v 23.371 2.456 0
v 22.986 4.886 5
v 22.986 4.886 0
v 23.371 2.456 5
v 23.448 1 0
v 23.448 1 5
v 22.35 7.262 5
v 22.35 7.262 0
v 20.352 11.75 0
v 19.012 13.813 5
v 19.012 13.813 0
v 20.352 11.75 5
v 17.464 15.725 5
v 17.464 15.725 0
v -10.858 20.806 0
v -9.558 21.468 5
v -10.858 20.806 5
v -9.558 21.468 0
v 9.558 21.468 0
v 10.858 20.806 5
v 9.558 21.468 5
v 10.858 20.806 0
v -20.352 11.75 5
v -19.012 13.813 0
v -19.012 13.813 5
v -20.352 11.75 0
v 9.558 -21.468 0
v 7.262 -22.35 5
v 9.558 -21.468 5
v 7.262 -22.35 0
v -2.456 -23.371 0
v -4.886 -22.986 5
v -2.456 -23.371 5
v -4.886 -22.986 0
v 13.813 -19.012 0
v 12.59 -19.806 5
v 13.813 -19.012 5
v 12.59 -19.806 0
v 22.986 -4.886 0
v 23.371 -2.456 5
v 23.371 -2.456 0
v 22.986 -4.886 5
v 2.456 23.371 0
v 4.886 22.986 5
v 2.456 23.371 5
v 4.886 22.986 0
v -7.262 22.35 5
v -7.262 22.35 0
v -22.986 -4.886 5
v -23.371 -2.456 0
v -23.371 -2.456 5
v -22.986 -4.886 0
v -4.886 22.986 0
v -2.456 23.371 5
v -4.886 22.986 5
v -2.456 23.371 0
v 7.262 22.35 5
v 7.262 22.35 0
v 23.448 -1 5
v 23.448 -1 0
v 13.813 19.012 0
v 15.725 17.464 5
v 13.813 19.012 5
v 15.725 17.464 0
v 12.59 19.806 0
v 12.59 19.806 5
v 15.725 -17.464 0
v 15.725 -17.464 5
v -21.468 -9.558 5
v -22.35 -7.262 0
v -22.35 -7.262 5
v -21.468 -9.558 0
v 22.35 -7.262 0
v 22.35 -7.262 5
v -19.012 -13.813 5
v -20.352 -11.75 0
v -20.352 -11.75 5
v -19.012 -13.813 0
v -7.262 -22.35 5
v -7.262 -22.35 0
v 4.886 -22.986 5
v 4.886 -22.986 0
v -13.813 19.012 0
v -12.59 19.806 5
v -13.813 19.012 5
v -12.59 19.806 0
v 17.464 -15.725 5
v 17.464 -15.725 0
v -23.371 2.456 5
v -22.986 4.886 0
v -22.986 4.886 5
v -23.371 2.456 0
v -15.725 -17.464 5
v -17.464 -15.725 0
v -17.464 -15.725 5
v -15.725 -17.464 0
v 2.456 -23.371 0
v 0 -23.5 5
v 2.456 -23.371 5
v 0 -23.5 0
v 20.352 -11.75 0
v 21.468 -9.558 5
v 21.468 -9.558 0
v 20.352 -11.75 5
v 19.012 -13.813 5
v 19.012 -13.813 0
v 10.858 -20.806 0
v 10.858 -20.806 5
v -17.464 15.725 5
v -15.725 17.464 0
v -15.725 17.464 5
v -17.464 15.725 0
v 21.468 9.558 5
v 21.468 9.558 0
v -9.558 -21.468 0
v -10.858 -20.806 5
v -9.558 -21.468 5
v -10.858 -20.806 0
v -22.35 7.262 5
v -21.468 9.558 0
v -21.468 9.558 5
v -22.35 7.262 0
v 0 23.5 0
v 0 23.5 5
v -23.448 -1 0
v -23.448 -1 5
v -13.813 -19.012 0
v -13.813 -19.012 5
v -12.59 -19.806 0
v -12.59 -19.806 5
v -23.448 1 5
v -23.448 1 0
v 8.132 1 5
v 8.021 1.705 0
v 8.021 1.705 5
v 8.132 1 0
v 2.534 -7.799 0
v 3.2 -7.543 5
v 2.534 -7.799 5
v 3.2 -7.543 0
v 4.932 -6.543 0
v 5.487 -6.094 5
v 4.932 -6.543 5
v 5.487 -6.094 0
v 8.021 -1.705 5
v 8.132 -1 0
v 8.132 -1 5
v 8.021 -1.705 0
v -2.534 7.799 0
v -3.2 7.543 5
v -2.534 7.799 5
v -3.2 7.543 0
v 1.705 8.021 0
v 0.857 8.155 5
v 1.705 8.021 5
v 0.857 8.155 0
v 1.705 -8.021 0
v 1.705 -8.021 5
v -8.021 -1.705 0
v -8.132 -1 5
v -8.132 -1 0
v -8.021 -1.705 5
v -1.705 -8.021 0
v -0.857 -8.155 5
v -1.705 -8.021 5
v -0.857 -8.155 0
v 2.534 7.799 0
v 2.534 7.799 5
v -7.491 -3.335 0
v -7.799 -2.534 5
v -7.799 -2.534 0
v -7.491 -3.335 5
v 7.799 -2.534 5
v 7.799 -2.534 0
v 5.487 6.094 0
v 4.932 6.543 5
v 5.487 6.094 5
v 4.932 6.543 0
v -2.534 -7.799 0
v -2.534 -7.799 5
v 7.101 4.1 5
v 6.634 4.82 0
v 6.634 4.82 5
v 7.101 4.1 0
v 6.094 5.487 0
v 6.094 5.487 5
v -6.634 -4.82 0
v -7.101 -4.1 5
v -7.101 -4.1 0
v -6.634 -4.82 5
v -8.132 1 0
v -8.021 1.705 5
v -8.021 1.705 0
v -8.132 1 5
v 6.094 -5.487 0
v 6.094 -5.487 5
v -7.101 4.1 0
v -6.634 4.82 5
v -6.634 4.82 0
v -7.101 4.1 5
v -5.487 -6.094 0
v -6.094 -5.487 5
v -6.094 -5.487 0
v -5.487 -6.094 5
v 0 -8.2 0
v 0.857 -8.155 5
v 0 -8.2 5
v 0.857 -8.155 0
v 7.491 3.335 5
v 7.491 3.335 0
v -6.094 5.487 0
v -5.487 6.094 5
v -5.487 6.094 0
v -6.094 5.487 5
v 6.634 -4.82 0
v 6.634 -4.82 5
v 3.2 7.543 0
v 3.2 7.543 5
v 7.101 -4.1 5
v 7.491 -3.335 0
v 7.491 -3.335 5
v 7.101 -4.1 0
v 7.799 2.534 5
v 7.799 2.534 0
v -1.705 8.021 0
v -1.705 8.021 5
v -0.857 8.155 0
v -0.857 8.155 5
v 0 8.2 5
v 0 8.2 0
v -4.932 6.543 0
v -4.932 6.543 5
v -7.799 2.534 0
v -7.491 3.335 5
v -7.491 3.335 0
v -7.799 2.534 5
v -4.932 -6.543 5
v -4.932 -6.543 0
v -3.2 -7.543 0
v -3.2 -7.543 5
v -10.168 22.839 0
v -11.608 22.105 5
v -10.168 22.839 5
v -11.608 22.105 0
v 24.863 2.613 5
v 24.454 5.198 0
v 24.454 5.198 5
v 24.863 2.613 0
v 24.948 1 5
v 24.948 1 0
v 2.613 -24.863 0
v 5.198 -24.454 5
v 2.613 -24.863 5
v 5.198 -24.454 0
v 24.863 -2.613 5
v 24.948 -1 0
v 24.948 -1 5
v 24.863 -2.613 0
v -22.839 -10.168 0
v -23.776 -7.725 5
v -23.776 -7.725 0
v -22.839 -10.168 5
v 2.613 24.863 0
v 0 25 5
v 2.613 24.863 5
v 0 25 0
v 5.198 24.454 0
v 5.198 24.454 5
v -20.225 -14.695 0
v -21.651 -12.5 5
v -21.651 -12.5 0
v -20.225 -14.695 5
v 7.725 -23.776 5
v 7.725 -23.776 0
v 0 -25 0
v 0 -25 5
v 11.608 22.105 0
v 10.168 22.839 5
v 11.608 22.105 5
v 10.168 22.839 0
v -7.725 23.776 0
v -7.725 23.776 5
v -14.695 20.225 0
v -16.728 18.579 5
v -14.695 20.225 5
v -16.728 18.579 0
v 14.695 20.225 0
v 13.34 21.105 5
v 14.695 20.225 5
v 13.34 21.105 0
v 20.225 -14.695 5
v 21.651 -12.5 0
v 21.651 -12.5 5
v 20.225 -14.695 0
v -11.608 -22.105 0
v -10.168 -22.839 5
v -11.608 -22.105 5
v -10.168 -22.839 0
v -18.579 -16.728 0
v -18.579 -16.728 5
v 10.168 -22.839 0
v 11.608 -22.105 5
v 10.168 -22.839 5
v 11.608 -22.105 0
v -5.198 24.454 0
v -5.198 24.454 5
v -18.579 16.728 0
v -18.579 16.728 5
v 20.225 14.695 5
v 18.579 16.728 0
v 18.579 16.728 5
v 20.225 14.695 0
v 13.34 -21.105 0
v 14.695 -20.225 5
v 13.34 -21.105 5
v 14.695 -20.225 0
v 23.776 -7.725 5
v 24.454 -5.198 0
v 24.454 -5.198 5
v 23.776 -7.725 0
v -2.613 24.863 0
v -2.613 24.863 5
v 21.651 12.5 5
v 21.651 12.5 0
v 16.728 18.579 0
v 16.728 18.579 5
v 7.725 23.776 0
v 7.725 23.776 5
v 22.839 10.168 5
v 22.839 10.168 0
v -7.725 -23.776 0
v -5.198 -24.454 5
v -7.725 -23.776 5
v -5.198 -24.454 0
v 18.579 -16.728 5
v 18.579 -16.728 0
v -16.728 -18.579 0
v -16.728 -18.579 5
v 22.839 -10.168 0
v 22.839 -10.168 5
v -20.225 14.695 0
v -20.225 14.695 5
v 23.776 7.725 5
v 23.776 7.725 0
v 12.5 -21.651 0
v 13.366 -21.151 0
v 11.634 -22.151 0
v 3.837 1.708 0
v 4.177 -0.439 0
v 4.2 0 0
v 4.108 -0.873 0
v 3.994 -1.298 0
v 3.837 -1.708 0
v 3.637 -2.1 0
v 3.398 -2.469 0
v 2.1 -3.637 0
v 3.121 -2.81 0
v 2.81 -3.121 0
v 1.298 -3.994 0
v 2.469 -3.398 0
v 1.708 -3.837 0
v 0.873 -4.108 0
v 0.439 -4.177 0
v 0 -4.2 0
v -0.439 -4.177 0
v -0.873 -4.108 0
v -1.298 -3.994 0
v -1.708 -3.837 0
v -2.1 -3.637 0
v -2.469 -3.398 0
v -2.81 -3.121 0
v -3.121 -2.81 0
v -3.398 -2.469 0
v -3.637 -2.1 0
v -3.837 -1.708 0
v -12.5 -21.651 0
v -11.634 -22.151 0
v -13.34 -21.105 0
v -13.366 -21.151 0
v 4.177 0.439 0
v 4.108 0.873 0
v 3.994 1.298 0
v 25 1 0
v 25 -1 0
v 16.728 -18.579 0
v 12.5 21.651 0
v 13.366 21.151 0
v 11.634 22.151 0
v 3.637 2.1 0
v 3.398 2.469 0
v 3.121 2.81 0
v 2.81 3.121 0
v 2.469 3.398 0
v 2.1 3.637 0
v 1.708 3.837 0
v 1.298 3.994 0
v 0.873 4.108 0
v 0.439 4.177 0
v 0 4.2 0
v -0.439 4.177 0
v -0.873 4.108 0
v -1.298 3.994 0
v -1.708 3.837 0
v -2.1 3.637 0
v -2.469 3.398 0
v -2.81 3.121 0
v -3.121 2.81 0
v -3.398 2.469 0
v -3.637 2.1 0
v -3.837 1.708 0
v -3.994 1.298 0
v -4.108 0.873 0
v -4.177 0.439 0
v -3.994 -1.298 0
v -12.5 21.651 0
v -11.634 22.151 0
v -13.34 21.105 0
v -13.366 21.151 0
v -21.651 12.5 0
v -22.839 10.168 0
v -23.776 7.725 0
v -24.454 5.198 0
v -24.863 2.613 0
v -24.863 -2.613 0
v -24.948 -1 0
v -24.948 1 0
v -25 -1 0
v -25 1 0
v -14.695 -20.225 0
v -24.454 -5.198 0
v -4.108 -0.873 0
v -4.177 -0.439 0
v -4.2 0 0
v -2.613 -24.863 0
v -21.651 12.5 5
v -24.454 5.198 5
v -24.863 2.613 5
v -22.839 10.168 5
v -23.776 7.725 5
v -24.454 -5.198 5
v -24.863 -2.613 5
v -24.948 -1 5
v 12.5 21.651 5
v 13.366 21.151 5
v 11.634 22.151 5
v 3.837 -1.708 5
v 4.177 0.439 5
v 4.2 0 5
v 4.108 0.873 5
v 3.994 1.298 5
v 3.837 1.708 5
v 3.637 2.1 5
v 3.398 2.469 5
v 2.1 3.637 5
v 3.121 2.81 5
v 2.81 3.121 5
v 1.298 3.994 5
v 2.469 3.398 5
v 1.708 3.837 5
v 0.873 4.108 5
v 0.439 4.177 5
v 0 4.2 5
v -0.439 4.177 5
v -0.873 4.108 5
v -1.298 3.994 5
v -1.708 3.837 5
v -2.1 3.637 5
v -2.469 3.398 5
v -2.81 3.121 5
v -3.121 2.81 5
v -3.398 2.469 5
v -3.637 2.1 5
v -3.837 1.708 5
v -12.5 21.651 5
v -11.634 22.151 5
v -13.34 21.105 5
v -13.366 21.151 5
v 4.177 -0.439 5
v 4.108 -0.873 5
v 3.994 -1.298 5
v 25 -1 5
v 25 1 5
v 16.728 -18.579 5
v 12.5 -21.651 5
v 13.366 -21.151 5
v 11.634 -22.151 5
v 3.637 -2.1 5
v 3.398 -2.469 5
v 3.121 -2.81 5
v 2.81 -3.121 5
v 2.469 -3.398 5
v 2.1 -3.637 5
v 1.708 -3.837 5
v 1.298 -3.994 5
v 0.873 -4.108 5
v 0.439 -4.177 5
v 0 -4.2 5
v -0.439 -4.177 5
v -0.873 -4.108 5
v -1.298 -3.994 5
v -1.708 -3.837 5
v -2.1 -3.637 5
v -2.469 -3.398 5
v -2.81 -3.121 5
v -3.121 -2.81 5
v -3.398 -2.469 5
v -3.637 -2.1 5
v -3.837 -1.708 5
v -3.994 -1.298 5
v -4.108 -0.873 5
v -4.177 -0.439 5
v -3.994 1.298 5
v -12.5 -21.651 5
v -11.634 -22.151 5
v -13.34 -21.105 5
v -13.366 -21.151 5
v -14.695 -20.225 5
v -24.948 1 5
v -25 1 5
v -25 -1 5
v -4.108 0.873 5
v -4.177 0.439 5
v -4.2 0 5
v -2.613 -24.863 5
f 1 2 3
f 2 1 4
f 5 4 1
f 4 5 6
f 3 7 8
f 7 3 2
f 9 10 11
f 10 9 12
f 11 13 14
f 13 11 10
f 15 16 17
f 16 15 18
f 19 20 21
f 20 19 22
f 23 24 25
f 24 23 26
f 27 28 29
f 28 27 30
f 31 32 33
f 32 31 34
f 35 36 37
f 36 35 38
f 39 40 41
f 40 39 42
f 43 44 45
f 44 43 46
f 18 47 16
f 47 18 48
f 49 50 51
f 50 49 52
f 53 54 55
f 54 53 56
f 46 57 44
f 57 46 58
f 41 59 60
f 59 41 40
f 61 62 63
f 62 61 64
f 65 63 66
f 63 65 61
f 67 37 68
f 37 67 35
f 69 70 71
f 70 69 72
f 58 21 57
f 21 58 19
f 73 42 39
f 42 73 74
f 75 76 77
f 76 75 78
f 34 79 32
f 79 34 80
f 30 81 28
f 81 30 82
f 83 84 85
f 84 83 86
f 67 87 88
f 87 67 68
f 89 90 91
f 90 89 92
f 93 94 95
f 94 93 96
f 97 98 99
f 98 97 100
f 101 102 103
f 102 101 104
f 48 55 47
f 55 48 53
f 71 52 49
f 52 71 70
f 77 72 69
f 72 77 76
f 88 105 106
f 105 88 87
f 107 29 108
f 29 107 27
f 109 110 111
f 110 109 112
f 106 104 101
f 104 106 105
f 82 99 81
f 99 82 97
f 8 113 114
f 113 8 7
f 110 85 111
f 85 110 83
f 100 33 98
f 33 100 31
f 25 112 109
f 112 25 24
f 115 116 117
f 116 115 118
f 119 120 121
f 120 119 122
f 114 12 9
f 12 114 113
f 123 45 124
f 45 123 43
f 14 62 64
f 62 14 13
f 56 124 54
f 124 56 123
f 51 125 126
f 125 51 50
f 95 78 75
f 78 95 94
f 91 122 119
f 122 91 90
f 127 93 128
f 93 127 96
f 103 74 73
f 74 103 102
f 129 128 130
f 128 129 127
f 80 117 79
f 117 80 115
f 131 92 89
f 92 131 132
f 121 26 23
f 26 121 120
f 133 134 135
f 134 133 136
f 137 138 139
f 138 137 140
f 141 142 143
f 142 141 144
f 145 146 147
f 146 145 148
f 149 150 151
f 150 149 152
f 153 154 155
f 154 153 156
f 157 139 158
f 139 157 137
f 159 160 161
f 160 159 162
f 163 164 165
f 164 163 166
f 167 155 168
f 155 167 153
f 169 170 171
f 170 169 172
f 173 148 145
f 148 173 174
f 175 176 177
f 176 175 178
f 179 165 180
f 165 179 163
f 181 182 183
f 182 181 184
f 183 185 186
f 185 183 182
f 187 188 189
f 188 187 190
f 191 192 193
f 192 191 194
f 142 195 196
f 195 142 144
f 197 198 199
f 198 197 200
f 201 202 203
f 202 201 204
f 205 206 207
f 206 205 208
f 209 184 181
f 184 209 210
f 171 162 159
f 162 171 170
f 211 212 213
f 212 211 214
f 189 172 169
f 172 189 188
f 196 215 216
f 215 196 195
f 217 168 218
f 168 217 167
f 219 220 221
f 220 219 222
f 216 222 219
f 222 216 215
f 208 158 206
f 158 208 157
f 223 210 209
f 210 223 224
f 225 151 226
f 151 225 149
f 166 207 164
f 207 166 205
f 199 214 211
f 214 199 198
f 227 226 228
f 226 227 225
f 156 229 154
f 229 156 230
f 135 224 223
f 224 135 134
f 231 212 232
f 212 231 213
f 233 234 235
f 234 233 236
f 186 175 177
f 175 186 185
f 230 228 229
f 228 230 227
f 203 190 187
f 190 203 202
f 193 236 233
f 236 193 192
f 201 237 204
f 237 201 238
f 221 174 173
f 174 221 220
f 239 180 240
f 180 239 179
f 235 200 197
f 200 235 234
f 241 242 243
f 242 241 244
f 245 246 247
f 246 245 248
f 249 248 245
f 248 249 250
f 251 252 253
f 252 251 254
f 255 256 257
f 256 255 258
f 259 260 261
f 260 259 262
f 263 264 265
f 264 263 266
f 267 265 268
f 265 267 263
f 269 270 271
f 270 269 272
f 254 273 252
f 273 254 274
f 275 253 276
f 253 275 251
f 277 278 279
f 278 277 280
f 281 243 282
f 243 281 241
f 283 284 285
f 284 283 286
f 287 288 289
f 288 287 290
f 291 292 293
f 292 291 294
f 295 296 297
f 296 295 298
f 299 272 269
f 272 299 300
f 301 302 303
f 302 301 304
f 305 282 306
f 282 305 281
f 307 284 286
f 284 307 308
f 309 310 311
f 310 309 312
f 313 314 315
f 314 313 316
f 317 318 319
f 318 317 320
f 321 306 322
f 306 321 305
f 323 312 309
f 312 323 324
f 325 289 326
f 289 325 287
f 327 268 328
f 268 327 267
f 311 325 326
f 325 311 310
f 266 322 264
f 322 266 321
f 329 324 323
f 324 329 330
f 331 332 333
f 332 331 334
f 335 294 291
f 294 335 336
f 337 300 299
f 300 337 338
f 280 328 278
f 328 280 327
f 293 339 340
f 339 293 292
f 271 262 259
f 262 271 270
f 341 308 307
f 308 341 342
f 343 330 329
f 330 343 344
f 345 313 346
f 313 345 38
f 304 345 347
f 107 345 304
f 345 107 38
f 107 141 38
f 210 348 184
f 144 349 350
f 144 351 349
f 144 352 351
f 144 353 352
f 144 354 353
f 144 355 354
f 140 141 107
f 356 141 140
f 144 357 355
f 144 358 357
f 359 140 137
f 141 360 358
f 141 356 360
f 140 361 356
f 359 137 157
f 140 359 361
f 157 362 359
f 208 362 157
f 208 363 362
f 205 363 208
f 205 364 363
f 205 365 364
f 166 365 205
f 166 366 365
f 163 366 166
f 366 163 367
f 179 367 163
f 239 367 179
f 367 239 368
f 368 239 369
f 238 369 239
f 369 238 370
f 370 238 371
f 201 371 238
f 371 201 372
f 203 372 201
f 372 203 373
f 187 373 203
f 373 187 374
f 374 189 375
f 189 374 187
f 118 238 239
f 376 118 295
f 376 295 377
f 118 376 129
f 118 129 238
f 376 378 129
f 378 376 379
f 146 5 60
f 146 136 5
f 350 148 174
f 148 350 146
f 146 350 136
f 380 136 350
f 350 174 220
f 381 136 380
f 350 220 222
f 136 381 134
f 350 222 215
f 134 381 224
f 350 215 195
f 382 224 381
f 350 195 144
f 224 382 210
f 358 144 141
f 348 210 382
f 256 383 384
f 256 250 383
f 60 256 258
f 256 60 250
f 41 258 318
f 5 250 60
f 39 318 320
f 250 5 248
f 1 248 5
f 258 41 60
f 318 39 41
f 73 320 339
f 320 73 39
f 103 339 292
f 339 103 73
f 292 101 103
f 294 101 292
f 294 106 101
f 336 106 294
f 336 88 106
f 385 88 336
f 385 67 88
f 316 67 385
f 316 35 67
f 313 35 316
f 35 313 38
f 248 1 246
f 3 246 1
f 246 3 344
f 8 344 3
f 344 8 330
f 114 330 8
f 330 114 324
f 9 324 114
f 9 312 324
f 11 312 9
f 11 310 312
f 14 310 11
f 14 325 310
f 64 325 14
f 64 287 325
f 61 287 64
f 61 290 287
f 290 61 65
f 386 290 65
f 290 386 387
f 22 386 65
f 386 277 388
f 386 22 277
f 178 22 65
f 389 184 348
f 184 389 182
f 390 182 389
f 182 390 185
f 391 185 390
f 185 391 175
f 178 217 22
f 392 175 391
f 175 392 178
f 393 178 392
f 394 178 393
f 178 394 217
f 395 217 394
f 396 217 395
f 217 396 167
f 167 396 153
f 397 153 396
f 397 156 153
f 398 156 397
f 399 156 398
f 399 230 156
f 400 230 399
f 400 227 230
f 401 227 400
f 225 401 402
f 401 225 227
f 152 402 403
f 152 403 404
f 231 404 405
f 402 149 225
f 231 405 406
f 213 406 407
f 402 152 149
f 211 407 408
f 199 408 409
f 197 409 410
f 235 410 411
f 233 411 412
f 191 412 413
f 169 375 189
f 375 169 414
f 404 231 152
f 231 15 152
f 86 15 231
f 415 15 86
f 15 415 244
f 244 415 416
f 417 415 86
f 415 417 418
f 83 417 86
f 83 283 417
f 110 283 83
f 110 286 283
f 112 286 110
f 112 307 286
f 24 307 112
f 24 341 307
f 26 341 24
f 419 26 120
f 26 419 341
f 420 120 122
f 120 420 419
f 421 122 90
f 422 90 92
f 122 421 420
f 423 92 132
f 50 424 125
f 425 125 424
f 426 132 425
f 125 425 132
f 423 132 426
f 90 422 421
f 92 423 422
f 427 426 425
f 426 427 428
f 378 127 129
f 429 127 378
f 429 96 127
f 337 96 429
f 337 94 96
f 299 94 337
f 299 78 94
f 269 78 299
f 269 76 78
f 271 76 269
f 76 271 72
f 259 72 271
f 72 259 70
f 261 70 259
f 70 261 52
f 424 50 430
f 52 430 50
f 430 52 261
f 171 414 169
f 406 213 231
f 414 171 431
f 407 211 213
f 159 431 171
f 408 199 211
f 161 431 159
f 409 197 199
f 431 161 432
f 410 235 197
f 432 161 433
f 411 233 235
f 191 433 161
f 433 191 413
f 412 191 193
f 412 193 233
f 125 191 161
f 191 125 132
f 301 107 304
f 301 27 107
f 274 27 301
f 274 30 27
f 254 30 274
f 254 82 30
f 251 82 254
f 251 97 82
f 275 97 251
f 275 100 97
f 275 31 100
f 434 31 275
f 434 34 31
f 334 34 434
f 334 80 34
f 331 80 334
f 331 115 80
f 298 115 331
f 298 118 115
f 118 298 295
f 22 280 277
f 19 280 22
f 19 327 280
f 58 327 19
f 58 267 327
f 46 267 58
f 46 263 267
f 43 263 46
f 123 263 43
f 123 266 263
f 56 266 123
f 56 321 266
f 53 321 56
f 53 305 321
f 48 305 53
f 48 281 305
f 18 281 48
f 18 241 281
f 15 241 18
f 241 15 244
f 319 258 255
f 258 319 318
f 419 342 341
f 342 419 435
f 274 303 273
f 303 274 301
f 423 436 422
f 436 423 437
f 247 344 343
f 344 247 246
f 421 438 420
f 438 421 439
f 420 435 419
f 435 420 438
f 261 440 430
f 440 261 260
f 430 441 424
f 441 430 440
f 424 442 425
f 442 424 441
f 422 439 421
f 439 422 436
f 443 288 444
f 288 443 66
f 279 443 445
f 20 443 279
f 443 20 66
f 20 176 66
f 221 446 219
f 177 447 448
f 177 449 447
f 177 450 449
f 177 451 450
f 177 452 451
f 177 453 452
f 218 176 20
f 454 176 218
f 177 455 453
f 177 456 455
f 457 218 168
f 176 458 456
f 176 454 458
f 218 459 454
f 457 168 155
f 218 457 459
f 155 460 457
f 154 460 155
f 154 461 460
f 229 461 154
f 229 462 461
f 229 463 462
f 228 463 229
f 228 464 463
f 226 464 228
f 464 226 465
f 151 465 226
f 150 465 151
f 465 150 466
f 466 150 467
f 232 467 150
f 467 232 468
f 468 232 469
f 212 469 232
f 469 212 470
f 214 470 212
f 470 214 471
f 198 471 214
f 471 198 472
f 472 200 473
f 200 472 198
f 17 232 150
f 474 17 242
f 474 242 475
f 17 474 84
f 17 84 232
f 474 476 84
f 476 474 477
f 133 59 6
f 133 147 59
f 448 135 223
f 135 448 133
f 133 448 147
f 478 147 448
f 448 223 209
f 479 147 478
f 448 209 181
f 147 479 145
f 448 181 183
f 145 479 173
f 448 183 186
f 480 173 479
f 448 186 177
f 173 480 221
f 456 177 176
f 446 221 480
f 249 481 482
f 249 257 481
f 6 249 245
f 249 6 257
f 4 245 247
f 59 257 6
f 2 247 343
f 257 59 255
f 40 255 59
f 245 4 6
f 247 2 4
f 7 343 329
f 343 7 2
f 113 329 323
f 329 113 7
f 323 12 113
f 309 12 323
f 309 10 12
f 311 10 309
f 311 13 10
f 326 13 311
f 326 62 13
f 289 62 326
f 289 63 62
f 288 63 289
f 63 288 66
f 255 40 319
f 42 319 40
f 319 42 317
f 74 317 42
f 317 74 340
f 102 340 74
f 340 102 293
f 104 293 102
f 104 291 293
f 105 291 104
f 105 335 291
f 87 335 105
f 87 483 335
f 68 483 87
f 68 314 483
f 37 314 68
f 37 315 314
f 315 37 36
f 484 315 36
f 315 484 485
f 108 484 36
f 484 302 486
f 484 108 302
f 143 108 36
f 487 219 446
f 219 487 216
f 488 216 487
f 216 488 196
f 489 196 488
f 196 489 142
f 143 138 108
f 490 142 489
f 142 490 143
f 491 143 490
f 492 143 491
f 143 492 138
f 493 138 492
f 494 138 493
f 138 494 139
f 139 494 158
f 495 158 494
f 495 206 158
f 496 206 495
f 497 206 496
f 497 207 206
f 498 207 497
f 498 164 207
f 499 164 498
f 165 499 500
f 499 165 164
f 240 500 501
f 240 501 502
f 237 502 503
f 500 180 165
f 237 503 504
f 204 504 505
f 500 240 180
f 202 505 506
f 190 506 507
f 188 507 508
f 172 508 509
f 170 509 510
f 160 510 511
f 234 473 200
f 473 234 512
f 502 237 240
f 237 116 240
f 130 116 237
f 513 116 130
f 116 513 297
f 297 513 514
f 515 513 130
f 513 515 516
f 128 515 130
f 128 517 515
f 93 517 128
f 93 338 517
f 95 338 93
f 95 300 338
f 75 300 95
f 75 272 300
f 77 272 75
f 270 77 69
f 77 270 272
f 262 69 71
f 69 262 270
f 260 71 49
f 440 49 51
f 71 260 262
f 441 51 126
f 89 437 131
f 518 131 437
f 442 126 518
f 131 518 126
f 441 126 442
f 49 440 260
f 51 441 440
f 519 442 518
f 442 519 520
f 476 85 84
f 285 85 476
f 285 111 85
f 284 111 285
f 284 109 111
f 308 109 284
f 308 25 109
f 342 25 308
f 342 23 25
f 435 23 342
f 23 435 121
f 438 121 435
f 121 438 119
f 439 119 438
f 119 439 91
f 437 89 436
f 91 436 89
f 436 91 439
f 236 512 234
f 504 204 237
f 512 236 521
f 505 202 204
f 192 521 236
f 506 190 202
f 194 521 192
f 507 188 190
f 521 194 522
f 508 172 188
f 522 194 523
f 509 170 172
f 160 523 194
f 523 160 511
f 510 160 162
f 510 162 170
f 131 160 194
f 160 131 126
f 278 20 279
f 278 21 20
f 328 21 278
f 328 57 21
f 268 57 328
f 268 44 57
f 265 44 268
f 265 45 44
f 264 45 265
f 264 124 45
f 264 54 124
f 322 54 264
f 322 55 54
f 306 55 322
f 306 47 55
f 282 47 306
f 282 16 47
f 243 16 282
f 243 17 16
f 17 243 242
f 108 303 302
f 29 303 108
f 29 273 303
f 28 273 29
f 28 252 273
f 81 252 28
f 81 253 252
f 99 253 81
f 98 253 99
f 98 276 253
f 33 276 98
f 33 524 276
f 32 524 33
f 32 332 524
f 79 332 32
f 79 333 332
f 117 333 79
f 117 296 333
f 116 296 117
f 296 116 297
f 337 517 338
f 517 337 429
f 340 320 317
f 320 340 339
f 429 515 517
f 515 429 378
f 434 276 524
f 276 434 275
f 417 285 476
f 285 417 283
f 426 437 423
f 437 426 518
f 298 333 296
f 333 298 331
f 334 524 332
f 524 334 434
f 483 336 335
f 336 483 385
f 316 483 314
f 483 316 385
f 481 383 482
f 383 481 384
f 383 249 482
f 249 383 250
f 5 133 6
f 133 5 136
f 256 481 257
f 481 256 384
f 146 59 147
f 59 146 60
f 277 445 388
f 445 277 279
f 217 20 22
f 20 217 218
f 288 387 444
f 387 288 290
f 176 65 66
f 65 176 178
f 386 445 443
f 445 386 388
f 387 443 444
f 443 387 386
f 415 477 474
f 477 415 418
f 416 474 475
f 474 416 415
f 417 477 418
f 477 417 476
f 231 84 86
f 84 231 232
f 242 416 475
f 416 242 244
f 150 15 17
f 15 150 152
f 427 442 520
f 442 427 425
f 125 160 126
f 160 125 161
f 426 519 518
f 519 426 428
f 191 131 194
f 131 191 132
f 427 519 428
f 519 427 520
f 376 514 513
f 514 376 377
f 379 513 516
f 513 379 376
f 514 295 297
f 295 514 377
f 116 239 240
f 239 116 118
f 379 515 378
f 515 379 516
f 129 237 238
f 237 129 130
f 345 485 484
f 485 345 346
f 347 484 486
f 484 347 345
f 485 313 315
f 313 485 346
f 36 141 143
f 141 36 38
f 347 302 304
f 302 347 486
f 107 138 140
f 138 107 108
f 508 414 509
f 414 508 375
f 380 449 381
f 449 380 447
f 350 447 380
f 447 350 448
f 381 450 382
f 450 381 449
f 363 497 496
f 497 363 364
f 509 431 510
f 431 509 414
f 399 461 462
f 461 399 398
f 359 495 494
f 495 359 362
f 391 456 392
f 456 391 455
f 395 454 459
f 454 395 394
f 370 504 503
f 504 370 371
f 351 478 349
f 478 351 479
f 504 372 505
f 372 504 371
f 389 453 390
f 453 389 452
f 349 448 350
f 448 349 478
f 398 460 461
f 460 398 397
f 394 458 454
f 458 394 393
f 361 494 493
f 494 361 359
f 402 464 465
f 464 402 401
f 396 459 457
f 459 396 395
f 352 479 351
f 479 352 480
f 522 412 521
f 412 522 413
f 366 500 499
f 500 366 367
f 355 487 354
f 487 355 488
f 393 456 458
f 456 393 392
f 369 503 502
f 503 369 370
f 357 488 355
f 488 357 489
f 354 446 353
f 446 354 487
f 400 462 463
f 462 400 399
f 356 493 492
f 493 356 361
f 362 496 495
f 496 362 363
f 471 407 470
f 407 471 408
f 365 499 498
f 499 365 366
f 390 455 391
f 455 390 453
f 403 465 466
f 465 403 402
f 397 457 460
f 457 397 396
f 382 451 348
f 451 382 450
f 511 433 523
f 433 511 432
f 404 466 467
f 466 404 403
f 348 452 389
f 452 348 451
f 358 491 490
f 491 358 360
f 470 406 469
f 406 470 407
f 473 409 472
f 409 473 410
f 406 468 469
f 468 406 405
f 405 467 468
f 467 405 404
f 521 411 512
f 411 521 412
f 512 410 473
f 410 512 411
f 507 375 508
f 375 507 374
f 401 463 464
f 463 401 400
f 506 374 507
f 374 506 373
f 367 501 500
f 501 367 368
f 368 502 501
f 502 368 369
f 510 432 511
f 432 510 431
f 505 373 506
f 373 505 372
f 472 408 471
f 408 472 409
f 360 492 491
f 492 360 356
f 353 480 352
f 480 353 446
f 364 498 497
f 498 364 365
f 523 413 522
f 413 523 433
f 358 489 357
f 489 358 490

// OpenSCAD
$fn=60;
abs = 1;
nf = 0;

diameter = 50;
width = 5;

tire_thickness = 5;
axel_radius = 4.2;
rim_thickness = 1.5;
hub_thickness = 4;

spokes = 6;
spokewidth = 2;

radius = diameter/2;

if (abs == 1 )
{    
    color("black")
    {
        difference()
        {
            union()
            {
            difference()
            {
                union()
                {
                    cylinder(r=radius, h=width);
                   
                }
                translate([0,0,-.5])
                {
                    difference()
                    {
                        cylinder(r=radius-rim_thickness, h=width+1);
                        cylinder(r=axel_radius+hub_thickness, h=width+1);
                    }
                }
            }
            
            for(i=[0:spokes])
                    {
                        rotate([0,0,i*360/spokes])
                            translate([0,-spokewidth/2,0])
                            cube([radius,spokewidth,width]);
                    }
                }
            translate([0,0,-.5])
                cylinder(r=axel_radius, h=width+1);
        }
        
    }
    
}

if (nf == 1)
{
    color("red")
    {
        difference()
        {
            
            cylinder(r=radius+tire_thickness, h=width-.01);
            translate([0,0,-.5])
                cylinder(r=radius, h=width+1);
        }
    }
}
